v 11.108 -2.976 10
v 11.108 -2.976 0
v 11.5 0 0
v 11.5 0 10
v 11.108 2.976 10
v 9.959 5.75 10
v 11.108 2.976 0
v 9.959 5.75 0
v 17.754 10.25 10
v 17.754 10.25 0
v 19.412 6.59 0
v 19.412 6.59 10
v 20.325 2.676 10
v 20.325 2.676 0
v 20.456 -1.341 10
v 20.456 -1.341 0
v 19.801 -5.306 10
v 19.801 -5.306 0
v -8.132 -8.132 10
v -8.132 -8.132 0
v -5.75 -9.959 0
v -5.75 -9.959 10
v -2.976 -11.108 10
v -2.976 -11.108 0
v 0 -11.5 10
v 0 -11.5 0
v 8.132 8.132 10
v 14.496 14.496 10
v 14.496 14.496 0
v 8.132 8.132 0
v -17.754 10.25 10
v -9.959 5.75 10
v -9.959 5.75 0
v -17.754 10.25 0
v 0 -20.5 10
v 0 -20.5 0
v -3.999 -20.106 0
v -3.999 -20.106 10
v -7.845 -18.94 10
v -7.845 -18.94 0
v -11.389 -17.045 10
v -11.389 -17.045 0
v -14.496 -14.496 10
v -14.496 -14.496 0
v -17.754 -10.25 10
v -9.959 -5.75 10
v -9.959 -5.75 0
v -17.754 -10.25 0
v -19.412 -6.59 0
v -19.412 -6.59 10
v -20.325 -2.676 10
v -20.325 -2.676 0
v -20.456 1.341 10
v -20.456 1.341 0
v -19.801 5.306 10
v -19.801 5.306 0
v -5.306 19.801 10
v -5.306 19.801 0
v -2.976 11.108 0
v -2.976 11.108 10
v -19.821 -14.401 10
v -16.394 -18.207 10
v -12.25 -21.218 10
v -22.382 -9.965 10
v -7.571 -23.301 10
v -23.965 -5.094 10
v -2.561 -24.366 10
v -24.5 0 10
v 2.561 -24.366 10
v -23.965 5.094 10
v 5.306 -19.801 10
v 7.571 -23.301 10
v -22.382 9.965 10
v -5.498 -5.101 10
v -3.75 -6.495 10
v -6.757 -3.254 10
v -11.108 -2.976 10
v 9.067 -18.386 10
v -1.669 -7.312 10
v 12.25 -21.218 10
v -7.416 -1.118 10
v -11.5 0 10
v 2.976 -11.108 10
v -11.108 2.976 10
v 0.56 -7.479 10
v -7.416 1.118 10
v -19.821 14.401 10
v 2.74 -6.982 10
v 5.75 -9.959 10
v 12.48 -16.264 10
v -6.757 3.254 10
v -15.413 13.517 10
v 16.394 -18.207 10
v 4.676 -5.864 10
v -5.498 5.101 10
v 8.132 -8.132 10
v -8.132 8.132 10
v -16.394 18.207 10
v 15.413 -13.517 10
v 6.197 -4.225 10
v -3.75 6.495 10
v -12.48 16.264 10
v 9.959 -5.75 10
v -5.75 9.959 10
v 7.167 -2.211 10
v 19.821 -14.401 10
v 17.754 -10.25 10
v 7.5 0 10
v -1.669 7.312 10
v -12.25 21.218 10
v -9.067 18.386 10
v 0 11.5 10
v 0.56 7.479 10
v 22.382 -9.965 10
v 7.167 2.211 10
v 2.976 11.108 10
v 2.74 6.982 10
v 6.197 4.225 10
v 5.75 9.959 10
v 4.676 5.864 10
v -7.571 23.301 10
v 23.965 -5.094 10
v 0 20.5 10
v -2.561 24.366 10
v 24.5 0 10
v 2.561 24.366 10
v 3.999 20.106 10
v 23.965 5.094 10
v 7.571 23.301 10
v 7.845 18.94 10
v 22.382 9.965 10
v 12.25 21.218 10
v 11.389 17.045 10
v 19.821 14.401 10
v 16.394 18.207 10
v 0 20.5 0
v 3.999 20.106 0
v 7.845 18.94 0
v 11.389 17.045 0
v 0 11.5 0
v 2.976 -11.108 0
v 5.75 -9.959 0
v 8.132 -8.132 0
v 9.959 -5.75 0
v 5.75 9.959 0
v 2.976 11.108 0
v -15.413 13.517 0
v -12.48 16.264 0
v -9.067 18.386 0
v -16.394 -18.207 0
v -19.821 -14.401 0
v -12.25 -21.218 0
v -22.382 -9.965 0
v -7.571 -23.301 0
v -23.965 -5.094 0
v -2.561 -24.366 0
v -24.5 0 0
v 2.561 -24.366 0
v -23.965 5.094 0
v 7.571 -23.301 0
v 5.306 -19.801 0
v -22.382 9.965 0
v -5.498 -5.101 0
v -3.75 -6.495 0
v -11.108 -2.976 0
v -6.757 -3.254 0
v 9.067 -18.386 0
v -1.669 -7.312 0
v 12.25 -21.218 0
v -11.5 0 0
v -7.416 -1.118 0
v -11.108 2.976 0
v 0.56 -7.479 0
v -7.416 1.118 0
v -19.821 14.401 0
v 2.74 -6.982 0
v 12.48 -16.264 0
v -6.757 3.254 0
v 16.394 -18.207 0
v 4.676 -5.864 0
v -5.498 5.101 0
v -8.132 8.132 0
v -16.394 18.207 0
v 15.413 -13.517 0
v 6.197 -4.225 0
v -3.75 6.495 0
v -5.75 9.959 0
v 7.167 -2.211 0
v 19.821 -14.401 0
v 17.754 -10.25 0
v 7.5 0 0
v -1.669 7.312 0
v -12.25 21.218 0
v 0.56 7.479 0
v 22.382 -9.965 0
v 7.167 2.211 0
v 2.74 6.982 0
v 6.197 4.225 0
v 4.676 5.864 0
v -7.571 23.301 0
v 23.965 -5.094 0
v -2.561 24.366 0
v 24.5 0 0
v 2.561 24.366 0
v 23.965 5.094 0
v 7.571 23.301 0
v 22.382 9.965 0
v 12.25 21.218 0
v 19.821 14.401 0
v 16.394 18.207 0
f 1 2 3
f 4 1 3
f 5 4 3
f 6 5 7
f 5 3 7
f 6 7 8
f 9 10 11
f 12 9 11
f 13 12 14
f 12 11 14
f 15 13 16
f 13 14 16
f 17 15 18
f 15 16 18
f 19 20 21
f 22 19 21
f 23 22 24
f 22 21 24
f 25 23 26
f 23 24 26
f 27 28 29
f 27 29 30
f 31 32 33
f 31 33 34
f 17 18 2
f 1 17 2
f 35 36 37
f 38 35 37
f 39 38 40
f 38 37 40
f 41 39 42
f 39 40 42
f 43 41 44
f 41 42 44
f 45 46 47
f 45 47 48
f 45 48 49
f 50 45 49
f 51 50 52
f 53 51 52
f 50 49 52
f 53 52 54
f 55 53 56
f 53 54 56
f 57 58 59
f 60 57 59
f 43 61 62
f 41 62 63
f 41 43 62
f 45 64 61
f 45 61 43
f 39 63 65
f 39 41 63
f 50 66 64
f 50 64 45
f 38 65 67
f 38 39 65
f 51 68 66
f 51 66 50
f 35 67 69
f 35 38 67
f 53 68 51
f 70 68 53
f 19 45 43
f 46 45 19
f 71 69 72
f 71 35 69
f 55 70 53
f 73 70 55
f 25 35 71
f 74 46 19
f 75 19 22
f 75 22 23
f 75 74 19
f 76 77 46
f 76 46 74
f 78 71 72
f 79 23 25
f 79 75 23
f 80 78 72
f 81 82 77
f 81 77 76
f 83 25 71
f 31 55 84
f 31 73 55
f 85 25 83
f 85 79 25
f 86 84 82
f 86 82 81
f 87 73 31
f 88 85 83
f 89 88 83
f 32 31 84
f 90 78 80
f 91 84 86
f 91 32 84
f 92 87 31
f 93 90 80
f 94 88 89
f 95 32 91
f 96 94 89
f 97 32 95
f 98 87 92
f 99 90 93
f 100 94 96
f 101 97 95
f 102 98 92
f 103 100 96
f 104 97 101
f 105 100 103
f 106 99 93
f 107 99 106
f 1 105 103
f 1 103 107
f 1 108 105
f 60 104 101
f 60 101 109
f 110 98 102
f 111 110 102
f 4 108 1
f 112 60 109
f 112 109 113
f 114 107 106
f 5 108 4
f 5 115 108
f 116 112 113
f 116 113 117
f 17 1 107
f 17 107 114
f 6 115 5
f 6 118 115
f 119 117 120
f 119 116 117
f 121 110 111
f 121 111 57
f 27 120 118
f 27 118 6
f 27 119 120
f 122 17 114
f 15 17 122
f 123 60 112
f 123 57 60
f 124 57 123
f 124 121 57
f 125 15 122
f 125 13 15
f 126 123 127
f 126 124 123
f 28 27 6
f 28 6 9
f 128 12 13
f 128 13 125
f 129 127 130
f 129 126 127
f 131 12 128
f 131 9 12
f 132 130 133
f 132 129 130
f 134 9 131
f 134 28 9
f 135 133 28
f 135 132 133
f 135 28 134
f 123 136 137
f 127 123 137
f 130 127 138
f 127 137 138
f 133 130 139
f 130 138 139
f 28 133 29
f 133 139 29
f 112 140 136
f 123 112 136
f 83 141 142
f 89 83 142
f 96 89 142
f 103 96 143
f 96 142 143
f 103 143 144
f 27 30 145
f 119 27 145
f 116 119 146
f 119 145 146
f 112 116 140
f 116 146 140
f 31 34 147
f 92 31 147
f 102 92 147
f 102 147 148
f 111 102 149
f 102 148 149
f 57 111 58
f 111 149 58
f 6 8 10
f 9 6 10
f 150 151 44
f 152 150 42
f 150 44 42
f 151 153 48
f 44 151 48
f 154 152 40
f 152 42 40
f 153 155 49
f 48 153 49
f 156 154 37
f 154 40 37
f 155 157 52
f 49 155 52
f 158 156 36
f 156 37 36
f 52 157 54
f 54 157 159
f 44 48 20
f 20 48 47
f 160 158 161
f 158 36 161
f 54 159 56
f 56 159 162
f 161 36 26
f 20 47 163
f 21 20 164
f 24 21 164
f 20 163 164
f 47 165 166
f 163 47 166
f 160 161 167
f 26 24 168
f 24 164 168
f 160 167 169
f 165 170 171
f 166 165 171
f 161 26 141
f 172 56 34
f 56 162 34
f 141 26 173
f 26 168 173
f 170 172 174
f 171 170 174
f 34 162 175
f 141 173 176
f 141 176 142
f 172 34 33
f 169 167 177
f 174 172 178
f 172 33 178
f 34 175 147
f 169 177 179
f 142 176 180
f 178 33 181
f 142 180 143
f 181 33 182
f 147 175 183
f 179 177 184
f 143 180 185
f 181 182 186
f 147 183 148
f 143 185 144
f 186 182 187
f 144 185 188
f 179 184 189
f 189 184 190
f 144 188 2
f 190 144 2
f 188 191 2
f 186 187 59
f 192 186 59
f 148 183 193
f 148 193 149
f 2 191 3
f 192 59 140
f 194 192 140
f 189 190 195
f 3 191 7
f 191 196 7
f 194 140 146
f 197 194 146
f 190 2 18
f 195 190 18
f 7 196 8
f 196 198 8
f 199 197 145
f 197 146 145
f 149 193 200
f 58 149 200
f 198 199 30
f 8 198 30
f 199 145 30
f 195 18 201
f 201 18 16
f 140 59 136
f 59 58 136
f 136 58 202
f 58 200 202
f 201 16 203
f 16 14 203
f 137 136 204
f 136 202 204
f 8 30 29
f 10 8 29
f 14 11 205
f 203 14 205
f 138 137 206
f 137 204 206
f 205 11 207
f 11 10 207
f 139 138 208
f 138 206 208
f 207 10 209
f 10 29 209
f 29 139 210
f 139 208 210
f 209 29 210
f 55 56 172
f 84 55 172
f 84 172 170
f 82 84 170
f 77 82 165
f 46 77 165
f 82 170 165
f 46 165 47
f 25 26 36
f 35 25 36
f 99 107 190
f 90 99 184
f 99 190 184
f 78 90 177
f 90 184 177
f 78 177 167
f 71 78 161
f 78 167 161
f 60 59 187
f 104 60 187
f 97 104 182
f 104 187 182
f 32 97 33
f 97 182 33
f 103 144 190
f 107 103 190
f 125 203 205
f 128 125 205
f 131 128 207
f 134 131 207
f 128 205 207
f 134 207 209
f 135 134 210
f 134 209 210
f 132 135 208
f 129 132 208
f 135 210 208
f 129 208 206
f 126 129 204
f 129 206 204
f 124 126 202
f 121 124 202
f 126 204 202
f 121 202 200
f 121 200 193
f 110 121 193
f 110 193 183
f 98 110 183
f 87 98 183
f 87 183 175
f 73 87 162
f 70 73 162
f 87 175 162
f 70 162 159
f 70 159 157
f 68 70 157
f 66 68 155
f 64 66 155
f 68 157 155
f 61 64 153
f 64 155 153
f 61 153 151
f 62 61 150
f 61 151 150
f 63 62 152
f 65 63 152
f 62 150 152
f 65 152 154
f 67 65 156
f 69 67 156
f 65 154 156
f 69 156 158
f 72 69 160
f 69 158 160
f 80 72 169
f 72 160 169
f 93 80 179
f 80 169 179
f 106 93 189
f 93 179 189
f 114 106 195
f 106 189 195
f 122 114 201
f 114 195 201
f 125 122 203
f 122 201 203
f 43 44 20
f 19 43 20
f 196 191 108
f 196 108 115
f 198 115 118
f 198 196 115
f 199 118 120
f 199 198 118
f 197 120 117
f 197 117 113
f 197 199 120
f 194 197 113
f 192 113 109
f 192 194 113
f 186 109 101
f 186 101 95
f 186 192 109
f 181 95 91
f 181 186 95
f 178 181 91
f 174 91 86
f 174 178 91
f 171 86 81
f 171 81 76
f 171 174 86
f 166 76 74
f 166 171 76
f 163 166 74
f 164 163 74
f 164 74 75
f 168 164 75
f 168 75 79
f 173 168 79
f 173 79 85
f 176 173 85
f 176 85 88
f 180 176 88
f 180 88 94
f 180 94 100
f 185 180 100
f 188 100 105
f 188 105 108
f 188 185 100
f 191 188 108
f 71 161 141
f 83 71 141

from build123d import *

# Parameters (mm, degrees)
F0_R     = 24.5
F0_R_2   = 7.5
F1_DEPTH = 10


with BuildPart() as f1:
    # F0 (on Top) → F1 (new body)
    with BuildSketch(Plane.XY):
        Circle(F0_R)
        with BuildLine():
            Line((0, -11.500001), (0, -20.500001))
            ThreePointArc((0, -20.500001), (-7.845011, -18.939531), (-14.49569, -14.49569))
            Line((-14.49569, -14.49569), (-8.131729, -8.131729))
            ThreePointArc((-8.131729, -8.131729), (-4.40086, -10.624615), (0, -11.500001))
        make_face(mode=Mode.SUBTRACT)
        with BuildLine():
            Line((-9.959293, -5.75), (-17.753521, -10.25))
            ThreePointArc((-17.753521, -10.25), (-20.32462, -2.675787), (-19.80148, 5.30579))
            Line((-19.80148, 5.30579), (-11.108148, 2.976419))
            ThreePointArc((-11.108148, 2.976419), (-11.401617, -1.501052), (-9.959293, -5.75))
        make_face(mode=Mode.SUBTRACT)
        Circle(F0_R_2, mode=Mode.SUBTRACT)
        with BuildLine():
            Line((9.959292, -5.750001), (17.753521, -10.250001))
            ThreePointArc((17.753521, -10.250001), (12.479609, -16.263744), (5.30579, -19.80148))
            Line((5.30579, -19.80148), (2.976419, -11.108148))
            ThreePointArc((2.976419, -11.108148), (7.000756, -9.123564), (9.959292, -5.750001))
        make_face(mode=Mode.SUBTRACT)
        with BuildLine():
            Line((-9.959293, 5.75), (-17.753521, 10.25))
            ThreePointArc((-17.753521, 10.25), (-12.47961, 16.263744), (-5.305791, 19.801479))
            Line((-5.305791, 19.801479), (-2.976419, 11.108147))
            ThreePointArc((-2.976419, 11.108147), (-7.000757, 9.123563), (-9.959293, 5.75))
        make_face(mode=Mode.SUBTRACT)
        with BuildLine():
            Line((9.959292, 5.75), (17.753521, 10.25))
            ThreePointArc((17.753521, 10.25), (20.32462, 2.675786), (19.80148, -5.305791))
            Line((19.80148, -5.305791), (11.108147, -2.97642))
            ThreePointArc((11.108147, -2.97642), (11.401616, 1.501051), (9.959292, 5.75))
        make_face(mode=Mode.SUBTRACT)
        with BuildLine():
            Line((0, 11.5), (0, 20.5))
            ThreePointArc((0, 20.5), (7.845011, 18.93953), (14.495689, 14.495689))
            Line((14.495689, 14.495689), (8.131728, 8.131728))
            ThreePointArc((8.131728, 8.131728), (4.40086, 10.624615), (0, 11.5))
        make_face(mode=Mode.SUBTRACT)
    extrude(amount=F1_DEPTH)


solid = f1.part
